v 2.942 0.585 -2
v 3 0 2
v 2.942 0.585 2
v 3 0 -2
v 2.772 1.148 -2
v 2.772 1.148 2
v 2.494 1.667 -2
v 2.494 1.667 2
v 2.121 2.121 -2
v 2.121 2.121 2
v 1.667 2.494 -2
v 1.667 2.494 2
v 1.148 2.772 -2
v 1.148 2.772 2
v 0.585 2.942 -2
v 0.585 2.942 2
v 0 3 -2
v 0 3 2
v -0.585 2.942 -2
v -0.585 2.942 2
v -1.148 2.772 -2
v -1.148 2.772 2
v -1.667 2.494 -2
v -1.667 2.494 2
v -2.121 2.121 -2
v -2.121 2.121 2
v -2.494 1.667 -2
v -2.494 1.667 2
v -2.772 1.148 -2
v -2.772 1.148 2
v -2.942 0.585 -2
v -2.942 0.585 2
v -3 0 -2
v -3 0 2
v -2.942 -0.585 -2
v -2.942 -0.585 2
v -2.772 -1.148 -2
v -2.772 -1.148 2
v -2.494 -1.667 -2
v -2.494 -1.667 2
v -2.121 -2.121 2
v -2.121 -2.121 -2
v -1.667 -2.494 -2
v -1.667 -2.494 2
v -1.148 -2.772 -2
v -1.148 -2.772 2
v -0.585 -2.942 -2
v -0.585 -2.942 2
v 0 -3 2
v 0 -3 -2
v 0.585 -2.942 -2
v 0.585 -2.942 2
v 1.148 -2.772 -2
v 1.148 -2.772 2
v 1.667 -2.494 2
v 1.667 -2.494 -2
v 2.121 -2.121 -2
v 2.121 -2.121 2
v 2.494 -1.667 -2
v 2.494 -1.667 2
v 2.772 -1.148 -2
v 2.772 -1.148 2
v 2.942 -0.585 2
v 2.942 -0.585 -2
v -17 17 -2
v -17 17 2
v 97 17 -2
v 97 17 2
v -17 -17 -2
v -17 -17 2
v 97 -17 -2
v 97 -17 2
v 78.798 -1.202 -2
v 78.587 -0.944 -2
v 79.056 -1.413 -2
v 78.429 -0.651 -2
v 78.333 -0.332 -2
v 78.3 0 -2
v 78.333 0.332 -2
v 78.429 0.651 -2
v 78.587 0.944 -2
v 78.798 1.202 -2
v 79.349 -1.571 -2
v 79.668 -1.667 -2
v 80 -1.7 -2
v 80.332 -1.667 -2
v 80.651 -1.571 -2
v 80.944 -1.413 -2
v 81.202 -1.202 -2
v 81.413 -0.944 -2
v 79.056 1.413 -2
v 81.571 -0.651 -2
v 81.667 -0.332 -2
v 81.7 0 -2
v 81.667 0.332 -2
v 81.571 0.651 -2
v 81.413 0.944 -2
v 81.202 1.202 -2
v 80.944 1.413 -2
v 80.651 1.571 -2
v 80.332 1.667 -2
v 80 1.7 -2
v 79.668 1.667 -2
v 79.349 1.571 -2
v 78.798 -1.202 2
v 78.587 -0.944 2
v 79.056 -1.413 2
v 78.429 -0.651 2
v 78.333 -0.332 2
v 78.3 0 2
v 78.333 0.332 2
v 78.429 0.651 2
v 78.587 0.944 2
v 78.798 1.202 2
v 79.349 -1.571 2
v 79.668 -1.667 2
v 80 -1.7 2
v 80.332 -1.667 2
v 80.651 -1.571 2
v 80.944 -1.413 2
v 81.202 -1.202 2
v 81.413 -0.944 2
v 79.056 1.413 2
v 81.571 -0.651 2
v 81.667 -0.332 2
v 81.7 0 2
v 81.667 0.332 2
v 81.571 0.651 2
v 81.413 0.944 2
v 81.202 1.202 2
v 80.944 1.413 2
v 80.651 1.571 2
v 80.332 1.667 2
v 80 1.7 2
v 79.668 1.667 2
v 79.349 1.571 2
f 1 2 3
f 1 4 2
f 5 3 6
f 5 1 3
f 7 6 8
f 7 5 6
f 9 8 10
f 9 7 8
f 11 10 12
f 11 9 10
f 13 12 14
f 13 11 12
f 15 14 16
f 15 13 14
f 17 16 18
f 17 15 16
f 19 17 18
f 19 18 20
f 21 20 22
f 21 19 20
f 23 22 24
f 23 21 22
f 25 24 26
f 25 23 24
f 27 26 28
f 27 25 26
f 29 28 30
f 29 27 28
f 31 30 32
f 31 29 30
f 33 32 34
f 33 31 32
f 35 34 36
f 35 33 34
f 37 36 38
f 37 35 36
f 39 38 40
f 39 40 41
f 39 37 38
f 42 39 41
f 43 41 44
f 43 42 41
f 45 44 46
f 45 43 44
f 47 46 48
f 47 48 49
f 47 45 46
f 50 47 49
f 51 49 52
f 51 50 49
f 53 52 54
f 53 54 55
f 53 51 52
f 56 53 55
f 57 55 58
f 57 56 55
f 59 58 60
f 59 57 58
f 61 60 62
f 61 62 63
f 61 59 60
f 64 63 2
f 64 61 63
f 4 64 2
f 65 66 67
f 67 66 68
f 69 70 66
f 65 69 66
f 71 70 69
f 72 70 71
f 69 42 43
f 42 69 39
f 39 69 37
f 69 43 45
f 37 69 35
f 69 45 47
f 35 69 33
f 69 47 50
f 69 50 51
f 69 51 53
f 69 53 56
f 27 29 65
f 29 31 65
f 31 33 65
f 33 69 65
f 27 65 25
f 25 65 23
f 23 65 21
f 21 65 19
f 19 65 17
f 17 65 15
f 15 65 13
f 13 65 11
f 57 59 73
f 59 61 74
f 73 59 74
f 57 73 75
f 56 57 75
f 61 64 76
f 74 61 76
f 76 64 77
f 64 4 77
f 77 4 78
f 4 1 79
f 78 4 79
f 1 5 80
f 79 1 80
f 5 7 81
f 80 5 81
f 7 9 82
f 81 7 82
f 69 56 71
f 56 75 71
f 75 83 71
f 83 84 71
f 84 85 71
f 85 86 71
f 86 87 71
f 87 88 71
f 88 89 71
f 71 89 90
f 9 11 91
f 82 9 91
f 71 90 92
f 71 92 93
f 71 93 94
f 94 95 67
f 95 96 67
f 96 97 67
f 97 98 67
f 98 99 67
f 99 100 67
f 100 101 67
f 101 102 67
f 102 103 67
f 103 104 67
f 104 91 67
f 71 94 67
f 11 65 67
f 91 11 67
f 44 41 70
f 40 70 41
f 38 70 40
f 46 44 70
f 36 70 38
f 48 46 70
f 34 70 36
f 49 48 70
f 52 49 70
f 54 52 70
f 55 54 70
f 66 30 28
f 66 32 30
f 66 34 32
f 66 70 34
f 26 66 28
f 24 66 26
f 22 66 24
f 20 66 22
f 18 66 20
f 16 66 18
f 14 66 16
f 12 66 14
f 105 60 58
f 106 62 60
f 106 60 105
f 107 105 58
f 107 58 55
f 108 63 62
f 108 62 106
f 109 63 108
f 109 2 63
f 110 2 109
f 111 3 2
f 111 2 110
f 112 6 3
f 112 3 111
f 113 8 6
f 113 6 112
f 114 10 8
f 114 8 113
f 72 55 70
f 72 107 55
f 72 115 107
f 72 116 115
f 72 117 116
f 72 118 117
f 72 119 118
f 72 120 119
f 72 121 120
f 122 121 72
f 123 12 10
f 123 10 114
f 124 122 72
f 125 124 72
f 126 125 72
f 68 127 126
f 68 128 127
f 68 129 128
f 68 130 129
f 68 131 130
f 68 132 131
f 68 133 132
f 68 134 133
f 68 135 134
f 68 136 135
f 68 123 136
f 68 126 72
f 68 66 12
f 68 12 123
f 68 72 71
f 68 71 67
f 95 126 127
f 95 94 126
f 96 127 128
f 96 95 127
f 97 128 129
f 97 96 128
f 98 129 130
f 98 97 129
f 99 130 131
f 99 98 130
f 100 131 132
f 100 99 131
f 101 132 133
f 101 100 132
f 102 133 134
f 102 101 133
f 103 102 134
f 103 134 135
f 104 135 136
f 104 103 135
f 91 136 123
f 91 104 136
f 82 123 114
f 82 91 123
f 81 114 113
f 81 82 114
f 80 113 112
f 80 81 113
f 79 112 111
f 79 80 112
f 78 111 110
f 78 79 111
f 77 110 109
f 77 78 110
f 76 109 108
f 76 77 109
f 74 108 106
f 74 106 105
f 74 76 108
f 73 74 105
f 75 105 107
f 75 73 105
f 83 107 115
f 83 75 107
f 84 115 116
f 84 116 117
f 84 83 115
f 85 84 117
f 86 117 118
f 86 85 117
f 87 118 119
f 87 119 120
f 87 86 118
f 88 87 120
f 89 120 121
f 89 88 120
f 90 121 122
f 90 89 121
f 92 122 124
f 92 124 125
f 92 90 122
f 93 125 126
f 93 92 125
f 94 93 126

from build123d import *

# Parameters (mm, degrees)
SKETCH_1_W      = 114
SKETCH_1_H      = 34
SKETCH_1_R      = 3
SKETCH_1_R_2    = 1.7
EXTRUDE_1_DEPTH = 2


with BuildPart() as part:
    # 草图1 → 凸台-拉伸1 (new, symmetric)
    with BuildSketch(Plane.XY):
        with Locations((40, 0)):
            Rectangle(SKETCH_1_W, SKETCH_1_H)
        Circle(SKETCH_1_R, mode=Mode.SUBTRACT)
        with Locations((80, 0)):
            Circle(SKETCH_1_R_2, mode=Mode.SUBTRACT)
    extrude(amount=EXTRUDE_1_DEPTH, both=True)


solid = part.part
